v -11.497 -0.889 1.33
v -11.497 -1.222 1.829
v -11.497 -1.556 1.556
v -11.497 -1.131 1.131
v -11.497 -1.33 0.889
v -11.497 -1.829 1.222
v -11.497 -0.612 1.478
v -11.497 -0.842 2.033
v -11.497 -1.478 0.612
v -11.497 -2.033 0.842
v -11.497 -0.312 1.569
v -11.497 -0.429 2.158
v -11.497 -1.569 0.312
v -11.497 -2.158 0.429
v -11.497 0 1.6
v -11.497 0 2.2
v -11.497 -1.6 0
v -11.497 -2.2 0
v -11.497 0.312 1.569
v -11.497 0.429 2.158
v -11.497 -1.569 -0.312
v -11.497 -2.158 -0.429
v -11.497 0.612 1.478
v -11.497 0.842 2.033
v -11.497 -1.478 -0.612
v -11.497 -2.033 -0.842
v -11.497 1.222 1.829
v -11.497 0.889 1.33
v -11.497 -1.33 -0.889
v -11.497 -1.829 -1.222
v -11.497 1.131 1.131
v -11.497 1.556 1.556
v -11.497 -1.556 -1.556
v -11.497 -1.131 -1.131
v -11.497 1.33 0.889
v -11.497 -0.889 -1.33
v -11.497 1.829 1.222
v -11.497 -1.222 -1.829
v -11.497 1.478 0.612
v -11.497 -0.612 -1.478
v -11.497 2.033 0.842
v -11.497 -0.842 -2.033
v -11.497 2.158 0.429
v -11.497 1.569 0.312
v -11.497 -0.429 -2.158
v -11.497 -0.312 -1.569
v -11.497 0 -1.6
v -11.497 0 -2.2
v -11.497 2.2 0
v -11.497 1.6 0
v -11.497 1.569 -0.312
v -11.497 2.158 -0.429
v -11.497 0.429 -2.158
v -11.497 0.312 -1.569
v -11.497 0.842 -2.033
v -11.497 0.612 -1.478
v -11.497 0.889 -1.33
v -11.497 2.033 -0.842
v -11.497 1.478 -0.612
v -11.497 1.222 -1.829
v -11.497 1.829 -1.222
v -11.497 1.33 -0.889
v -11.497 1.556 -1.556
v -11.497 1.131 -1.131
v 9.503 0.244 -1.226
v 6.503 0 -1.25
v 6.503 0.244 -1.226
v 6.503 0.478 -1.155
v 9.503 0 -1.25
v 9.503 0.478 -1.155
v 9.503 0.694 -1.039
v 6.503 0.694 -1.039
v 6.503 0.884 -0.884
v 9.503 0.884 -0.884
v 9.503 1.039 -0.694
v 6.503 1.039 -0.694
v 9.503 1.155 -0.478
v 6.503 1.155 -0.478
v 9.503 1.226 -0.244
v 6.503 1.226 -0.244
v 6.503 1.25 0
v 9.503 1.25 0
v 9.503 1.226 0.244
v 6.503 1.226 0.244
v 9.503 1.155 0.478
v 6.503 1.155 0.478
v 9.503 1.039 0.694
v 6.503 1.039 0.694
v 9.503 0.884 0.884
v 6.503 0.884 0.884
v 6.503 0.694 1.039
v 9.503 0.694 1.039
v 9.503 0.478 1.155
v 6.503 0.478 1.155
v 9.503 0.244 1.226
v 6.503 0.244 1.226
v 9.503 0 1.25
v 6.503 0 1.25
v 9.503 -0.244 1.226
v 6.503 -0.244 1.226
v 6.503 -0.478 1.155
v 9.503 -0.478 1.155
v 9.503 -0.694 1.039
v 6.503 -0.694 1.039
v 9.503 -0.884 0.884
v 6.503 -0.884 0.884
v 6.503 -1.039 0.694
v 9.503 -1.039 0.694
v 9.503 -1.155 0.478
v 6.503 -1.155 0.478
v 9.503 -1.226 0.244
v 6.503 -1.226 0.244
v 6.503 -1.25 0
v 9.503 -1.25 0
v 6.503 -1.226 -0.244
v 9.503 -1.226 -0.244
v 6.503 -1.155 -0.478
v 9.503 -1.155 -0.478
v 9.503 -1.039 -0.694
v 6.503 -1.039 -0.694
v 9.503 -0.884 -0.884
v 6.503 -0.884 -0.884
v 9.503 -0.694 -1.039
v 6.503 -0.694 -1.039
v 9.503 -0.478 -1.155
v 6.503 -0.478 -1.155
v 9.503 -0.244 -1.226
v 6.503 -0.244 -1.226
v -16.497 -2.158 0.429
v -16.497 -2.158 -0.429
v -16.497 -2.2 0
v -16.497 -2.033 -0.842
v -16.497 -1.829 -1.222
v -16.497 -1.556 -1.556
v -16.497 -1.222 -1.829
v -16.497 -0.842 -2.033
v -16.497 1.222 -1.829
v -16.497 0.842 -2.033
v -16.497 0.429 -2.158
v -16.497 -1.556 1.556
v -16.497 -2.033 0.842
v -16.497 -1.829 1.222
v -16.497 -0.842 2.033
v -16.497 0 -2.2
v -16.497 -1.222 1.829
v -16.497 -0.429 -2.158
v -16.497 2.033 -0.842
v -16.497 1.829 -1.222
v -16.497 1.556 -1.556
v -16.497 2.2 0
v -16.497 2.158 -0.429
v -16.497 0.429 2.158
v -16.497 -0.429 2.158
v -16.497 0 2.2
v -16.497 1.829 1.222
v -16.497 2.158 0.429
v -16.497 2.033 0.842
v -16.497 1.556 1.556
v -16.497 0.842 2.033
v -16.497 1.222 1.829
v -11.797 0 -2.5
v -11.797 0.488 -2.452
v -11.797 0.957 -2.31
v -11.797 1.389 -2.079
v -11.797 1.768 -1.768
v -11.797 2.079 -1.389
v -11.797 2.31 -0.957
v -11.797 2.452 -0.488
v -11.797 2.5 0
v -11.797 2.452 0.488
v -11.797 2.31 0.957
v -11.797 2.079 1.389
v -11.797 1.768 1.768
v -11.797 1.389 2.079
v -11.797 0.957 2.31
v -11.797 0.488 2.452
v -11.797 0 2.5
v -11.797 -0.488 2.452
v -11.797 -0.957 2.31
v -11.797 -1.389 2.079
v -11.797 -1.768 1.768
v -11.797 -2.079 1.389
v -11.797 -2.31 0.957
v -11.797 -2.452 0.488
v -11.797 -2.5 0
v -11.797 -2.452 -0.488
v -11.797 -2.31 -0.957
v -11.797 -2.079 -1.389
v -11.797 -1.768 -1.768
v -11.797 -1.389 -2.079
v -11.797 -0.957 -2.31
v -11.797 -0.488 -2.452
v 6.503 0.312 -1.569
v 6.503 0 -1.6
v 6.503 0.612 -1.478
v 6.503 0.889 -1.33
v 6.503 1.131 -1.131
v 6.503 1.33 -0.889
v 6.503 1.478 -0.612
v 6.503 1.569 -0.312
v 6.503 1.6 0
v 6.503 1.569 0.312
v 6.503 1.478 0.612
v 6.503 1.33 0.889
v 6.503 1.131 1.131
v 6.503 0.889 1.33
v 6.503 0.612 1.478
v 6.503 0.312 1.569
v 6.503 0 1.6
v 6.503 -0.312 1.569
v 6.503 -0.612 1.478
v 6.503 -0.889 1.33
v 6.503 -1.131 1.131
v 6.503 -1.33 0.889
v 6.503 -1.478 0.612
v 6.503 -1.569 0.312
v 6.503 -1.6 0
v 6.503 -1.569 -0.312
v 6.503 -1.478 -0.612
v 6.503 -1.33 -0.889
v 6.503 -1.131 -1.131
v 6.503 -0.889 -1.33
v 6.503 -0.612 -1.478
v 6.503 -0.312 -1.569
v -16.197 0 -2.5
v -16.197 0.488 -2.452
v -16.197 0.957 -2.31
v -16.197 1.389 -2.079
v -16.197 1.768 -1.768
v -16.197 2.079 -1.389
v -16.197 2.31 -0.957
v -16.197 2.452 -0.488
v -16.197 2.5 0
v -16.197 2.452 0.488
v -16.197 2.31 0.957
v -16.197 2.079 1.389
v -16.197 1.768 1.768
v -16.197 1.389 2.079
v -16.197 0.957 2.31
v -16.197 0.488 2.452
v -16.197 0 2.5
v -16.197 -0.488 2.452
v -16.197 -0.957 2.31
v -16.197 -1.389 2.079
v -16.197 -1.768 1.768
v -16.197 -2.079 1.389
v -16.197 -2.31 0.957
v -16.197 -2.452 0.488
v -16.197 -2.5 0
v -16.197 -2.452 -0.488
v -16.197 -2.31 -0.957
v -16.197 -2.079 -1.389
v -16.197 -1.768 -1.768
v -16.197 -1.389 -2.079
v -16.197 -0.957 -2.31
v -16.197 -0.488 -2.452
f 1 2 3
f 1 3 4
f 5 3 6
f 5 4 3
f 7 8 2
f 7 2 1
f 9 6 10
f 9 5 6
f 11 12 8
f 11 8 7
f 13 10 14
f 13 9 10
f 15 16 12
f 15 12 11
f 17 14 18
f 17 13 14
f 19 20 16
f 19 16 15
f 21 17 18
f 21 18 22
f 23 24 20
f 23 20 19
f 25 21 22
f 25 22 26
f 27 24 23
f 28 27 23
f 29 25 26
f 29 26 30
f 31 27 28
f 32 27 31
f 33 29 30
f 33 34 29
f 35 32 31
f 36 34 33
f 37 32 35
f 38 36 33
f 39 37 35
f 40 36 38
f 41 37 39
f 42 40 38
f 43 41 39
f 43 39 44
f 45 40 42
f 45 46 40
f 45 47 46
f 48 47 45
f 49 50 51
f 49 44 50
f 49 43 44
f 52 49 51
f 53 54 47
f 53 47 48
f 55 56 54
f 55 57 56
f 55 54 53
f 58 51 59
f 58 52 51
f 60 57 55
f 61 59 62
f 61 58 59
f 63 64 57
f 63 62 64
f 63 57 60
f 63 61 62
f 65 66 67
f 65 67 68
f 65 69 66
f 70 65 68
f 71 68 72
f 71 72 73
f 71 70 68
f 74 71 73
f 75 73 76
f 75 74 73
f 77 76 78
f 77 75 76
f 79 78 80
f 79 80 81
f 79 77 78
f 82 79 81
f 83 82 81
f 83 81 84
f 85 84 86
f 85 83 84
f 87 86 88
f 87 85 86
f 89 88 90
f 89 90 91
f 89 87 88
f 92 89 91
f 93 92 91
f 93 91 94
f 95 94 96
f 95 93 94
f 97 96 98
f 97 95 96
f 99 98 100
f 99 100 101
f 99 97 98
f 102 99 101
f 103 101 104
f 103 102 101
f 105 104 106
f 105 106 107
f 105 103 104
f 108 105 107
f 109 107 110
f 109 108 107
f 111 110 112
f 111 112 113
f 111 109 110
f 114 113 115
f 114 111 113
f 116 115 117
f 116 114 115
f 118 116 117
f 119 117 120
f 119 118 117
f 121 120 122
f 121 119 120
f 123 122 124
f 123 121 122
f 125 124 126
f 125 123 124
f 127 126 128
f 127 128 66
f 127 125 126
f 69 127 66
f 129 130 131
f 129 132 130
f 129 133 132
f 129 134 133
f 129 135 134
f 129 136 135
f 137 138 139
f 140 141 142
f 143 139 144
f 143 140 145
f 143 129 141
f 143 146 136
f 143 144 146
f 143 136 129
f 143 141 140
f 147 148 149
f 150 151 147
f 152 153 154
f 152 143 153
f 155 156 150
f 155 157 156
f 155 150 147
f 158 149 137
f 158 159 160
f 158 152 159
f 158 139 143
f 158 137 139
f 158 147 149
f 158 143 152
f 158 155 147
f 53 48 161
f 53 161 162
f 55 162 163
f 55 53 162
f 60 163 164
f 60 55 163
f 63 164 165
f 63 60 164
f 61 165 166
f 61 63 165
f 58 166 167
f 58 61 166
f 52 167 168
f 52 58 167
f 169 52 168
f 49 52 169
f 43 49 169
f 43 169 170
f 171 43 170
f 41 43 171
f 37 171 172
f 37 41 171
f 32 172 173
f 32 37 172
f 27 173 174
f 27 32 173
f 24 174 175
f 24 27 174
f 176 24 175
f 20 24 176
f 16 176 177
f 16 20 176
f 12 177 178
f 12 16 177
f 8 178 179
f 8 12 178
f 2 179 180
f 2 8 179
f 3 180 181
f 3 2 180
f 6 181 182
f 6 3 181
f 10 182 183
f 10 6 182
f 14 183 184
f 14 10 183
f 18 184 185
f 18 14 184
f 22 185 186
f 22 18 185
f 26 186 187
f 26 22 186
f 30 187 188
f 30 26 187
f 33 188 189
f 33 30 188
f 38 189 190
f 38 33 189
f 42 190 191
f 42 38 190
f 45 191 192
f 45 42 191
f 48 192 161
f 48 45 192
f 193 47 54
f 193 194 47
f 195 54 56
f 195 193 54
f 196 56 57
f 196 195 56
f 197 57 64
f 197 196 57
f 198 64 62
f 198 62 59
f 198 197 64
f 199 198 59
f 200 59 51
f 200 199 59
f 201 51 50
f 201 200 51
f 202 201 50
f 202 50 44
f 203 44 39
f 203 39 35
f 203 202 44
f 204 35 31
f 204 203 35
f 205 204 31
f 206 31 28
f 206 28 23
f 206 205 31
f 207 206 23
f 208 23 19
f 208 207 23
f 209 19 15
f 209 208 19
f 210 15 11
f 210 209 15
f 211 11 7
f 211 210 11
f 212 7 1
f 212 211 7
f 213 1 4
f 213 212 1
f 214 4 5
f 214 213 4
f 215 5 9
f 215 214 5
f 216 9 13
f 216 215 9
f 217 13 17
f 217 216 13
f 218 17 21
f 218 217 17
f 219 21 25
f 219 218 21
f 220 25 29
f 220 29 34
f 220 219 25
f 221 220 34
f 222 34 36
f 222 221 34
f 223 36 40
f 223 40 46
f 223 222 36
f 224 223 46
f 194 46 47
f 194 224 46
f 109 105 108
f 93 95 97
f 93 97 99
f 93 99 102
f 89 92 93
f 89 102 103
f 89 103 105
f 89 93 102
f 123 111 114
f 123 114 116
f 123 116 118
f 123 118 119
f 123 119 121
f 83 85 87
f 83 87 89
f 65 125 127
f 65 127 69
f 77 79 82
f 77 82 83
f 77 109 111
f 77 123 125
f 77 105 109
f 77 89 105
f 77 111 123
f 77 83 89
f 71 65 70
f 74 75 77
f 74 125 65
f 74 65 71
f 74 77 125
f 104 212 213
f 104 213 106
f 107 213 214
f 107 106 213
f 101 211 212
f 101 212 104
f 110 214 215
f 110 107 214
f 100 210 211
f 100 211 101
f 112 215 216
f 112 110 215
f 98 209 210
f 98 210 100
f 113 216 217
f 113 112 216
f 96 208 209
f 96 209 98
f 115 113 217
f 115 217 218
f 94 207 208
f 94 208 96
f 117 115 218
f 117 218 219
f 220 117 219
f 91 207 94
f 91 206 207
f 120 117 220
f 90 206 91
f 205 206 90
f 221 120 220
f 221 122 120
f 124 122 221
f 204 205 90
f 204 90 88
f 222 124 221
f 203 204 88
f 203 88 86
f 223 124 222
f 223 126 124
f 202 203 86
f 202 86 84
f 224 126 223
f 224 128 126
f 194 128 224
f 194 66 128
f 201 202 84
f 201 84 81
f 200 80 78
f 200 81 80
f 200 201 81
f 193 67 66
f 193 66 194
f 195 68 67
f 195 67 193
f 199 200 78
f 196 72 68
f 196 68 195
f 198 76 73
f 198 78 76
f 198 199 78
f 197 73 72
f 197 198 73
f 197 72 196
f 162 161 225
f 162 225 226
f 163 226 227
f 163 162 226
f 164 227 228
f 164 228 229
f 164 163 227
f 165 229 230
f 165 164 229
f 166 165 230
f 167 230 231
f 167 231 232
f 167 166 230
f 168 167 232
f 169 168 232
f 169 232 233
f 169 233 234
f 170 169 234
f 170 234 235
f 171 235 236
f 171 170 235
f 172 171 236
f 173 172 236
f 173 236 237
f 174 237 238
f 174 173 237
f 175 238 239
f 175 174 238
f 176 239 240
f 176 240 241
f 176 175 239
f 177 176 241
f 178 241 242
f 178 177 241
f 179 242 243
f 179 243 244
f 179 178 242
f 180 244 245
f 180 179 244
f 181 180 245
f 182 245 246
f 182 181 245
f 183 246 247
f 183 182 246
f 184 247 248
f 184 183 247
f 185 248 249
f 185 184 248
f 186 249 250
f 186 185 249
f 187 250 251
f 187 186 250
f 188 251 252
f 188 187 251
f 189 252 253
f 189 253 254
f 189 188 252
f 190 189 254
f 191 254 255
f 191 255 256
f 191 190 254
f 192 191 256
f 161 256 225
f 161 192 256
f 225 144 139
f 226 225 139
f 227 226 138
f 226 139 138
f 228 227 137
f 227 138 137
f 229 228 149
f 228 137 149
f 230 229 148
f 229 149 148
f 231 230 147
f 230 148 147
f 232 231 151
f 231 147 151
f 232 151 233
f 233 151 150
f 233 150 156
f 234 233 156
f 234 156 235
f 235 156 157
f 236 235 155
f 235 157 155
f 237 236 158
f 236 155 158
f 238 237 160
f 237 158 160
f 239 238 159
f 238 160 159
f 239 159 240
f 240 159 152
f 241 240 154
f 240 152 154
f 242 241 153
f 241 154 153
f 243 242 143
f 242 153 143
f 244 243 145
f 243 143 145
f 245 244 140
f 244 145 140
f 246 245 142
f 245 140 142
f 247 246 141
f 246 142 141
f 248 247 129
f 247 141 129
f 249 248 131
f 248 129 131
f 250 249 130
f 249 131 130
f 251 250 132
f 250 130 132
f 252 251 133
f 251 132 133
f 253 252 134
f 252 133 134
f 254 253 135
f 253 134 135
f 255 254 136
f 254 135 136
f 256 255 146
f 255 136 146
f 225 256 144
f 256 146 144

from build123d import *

# Parameters (mm, degrees)
CHAMFER1_SIZE = 0.3


with BuildPart() as part:
    # Sketch2 → Revolve1 (revolve)
    with BuildSketch(Plane(origin=(0, 0, 0), x_dir=(1, 0, 0), z_dir=(0, 1, 0))):
        Polygon((-16.496503497, 2.5), (-11.496503497, 2.5), (-11.496503497, 1.6), (6.503496503, 1.6), (6.503496503, 1.25), (9.503496503, 1.25), (9.503496503, 0), (-16.496503497, 0), align=None)
    revolve(axis=Axis((-6.153846154, 0, 0), (1, 0, 0)))

    # Chamfer1
    chamfer1_edges = [part.edges().sort_by_distance(p)[0] for p in [
        (-16.496503497, 0, 2.5),
        (-11.496503497, 0, 2.5),
    ]]
    chamfer(chamfer1_edges, length=CHAMFER1_SIZE)


solid = part.part
